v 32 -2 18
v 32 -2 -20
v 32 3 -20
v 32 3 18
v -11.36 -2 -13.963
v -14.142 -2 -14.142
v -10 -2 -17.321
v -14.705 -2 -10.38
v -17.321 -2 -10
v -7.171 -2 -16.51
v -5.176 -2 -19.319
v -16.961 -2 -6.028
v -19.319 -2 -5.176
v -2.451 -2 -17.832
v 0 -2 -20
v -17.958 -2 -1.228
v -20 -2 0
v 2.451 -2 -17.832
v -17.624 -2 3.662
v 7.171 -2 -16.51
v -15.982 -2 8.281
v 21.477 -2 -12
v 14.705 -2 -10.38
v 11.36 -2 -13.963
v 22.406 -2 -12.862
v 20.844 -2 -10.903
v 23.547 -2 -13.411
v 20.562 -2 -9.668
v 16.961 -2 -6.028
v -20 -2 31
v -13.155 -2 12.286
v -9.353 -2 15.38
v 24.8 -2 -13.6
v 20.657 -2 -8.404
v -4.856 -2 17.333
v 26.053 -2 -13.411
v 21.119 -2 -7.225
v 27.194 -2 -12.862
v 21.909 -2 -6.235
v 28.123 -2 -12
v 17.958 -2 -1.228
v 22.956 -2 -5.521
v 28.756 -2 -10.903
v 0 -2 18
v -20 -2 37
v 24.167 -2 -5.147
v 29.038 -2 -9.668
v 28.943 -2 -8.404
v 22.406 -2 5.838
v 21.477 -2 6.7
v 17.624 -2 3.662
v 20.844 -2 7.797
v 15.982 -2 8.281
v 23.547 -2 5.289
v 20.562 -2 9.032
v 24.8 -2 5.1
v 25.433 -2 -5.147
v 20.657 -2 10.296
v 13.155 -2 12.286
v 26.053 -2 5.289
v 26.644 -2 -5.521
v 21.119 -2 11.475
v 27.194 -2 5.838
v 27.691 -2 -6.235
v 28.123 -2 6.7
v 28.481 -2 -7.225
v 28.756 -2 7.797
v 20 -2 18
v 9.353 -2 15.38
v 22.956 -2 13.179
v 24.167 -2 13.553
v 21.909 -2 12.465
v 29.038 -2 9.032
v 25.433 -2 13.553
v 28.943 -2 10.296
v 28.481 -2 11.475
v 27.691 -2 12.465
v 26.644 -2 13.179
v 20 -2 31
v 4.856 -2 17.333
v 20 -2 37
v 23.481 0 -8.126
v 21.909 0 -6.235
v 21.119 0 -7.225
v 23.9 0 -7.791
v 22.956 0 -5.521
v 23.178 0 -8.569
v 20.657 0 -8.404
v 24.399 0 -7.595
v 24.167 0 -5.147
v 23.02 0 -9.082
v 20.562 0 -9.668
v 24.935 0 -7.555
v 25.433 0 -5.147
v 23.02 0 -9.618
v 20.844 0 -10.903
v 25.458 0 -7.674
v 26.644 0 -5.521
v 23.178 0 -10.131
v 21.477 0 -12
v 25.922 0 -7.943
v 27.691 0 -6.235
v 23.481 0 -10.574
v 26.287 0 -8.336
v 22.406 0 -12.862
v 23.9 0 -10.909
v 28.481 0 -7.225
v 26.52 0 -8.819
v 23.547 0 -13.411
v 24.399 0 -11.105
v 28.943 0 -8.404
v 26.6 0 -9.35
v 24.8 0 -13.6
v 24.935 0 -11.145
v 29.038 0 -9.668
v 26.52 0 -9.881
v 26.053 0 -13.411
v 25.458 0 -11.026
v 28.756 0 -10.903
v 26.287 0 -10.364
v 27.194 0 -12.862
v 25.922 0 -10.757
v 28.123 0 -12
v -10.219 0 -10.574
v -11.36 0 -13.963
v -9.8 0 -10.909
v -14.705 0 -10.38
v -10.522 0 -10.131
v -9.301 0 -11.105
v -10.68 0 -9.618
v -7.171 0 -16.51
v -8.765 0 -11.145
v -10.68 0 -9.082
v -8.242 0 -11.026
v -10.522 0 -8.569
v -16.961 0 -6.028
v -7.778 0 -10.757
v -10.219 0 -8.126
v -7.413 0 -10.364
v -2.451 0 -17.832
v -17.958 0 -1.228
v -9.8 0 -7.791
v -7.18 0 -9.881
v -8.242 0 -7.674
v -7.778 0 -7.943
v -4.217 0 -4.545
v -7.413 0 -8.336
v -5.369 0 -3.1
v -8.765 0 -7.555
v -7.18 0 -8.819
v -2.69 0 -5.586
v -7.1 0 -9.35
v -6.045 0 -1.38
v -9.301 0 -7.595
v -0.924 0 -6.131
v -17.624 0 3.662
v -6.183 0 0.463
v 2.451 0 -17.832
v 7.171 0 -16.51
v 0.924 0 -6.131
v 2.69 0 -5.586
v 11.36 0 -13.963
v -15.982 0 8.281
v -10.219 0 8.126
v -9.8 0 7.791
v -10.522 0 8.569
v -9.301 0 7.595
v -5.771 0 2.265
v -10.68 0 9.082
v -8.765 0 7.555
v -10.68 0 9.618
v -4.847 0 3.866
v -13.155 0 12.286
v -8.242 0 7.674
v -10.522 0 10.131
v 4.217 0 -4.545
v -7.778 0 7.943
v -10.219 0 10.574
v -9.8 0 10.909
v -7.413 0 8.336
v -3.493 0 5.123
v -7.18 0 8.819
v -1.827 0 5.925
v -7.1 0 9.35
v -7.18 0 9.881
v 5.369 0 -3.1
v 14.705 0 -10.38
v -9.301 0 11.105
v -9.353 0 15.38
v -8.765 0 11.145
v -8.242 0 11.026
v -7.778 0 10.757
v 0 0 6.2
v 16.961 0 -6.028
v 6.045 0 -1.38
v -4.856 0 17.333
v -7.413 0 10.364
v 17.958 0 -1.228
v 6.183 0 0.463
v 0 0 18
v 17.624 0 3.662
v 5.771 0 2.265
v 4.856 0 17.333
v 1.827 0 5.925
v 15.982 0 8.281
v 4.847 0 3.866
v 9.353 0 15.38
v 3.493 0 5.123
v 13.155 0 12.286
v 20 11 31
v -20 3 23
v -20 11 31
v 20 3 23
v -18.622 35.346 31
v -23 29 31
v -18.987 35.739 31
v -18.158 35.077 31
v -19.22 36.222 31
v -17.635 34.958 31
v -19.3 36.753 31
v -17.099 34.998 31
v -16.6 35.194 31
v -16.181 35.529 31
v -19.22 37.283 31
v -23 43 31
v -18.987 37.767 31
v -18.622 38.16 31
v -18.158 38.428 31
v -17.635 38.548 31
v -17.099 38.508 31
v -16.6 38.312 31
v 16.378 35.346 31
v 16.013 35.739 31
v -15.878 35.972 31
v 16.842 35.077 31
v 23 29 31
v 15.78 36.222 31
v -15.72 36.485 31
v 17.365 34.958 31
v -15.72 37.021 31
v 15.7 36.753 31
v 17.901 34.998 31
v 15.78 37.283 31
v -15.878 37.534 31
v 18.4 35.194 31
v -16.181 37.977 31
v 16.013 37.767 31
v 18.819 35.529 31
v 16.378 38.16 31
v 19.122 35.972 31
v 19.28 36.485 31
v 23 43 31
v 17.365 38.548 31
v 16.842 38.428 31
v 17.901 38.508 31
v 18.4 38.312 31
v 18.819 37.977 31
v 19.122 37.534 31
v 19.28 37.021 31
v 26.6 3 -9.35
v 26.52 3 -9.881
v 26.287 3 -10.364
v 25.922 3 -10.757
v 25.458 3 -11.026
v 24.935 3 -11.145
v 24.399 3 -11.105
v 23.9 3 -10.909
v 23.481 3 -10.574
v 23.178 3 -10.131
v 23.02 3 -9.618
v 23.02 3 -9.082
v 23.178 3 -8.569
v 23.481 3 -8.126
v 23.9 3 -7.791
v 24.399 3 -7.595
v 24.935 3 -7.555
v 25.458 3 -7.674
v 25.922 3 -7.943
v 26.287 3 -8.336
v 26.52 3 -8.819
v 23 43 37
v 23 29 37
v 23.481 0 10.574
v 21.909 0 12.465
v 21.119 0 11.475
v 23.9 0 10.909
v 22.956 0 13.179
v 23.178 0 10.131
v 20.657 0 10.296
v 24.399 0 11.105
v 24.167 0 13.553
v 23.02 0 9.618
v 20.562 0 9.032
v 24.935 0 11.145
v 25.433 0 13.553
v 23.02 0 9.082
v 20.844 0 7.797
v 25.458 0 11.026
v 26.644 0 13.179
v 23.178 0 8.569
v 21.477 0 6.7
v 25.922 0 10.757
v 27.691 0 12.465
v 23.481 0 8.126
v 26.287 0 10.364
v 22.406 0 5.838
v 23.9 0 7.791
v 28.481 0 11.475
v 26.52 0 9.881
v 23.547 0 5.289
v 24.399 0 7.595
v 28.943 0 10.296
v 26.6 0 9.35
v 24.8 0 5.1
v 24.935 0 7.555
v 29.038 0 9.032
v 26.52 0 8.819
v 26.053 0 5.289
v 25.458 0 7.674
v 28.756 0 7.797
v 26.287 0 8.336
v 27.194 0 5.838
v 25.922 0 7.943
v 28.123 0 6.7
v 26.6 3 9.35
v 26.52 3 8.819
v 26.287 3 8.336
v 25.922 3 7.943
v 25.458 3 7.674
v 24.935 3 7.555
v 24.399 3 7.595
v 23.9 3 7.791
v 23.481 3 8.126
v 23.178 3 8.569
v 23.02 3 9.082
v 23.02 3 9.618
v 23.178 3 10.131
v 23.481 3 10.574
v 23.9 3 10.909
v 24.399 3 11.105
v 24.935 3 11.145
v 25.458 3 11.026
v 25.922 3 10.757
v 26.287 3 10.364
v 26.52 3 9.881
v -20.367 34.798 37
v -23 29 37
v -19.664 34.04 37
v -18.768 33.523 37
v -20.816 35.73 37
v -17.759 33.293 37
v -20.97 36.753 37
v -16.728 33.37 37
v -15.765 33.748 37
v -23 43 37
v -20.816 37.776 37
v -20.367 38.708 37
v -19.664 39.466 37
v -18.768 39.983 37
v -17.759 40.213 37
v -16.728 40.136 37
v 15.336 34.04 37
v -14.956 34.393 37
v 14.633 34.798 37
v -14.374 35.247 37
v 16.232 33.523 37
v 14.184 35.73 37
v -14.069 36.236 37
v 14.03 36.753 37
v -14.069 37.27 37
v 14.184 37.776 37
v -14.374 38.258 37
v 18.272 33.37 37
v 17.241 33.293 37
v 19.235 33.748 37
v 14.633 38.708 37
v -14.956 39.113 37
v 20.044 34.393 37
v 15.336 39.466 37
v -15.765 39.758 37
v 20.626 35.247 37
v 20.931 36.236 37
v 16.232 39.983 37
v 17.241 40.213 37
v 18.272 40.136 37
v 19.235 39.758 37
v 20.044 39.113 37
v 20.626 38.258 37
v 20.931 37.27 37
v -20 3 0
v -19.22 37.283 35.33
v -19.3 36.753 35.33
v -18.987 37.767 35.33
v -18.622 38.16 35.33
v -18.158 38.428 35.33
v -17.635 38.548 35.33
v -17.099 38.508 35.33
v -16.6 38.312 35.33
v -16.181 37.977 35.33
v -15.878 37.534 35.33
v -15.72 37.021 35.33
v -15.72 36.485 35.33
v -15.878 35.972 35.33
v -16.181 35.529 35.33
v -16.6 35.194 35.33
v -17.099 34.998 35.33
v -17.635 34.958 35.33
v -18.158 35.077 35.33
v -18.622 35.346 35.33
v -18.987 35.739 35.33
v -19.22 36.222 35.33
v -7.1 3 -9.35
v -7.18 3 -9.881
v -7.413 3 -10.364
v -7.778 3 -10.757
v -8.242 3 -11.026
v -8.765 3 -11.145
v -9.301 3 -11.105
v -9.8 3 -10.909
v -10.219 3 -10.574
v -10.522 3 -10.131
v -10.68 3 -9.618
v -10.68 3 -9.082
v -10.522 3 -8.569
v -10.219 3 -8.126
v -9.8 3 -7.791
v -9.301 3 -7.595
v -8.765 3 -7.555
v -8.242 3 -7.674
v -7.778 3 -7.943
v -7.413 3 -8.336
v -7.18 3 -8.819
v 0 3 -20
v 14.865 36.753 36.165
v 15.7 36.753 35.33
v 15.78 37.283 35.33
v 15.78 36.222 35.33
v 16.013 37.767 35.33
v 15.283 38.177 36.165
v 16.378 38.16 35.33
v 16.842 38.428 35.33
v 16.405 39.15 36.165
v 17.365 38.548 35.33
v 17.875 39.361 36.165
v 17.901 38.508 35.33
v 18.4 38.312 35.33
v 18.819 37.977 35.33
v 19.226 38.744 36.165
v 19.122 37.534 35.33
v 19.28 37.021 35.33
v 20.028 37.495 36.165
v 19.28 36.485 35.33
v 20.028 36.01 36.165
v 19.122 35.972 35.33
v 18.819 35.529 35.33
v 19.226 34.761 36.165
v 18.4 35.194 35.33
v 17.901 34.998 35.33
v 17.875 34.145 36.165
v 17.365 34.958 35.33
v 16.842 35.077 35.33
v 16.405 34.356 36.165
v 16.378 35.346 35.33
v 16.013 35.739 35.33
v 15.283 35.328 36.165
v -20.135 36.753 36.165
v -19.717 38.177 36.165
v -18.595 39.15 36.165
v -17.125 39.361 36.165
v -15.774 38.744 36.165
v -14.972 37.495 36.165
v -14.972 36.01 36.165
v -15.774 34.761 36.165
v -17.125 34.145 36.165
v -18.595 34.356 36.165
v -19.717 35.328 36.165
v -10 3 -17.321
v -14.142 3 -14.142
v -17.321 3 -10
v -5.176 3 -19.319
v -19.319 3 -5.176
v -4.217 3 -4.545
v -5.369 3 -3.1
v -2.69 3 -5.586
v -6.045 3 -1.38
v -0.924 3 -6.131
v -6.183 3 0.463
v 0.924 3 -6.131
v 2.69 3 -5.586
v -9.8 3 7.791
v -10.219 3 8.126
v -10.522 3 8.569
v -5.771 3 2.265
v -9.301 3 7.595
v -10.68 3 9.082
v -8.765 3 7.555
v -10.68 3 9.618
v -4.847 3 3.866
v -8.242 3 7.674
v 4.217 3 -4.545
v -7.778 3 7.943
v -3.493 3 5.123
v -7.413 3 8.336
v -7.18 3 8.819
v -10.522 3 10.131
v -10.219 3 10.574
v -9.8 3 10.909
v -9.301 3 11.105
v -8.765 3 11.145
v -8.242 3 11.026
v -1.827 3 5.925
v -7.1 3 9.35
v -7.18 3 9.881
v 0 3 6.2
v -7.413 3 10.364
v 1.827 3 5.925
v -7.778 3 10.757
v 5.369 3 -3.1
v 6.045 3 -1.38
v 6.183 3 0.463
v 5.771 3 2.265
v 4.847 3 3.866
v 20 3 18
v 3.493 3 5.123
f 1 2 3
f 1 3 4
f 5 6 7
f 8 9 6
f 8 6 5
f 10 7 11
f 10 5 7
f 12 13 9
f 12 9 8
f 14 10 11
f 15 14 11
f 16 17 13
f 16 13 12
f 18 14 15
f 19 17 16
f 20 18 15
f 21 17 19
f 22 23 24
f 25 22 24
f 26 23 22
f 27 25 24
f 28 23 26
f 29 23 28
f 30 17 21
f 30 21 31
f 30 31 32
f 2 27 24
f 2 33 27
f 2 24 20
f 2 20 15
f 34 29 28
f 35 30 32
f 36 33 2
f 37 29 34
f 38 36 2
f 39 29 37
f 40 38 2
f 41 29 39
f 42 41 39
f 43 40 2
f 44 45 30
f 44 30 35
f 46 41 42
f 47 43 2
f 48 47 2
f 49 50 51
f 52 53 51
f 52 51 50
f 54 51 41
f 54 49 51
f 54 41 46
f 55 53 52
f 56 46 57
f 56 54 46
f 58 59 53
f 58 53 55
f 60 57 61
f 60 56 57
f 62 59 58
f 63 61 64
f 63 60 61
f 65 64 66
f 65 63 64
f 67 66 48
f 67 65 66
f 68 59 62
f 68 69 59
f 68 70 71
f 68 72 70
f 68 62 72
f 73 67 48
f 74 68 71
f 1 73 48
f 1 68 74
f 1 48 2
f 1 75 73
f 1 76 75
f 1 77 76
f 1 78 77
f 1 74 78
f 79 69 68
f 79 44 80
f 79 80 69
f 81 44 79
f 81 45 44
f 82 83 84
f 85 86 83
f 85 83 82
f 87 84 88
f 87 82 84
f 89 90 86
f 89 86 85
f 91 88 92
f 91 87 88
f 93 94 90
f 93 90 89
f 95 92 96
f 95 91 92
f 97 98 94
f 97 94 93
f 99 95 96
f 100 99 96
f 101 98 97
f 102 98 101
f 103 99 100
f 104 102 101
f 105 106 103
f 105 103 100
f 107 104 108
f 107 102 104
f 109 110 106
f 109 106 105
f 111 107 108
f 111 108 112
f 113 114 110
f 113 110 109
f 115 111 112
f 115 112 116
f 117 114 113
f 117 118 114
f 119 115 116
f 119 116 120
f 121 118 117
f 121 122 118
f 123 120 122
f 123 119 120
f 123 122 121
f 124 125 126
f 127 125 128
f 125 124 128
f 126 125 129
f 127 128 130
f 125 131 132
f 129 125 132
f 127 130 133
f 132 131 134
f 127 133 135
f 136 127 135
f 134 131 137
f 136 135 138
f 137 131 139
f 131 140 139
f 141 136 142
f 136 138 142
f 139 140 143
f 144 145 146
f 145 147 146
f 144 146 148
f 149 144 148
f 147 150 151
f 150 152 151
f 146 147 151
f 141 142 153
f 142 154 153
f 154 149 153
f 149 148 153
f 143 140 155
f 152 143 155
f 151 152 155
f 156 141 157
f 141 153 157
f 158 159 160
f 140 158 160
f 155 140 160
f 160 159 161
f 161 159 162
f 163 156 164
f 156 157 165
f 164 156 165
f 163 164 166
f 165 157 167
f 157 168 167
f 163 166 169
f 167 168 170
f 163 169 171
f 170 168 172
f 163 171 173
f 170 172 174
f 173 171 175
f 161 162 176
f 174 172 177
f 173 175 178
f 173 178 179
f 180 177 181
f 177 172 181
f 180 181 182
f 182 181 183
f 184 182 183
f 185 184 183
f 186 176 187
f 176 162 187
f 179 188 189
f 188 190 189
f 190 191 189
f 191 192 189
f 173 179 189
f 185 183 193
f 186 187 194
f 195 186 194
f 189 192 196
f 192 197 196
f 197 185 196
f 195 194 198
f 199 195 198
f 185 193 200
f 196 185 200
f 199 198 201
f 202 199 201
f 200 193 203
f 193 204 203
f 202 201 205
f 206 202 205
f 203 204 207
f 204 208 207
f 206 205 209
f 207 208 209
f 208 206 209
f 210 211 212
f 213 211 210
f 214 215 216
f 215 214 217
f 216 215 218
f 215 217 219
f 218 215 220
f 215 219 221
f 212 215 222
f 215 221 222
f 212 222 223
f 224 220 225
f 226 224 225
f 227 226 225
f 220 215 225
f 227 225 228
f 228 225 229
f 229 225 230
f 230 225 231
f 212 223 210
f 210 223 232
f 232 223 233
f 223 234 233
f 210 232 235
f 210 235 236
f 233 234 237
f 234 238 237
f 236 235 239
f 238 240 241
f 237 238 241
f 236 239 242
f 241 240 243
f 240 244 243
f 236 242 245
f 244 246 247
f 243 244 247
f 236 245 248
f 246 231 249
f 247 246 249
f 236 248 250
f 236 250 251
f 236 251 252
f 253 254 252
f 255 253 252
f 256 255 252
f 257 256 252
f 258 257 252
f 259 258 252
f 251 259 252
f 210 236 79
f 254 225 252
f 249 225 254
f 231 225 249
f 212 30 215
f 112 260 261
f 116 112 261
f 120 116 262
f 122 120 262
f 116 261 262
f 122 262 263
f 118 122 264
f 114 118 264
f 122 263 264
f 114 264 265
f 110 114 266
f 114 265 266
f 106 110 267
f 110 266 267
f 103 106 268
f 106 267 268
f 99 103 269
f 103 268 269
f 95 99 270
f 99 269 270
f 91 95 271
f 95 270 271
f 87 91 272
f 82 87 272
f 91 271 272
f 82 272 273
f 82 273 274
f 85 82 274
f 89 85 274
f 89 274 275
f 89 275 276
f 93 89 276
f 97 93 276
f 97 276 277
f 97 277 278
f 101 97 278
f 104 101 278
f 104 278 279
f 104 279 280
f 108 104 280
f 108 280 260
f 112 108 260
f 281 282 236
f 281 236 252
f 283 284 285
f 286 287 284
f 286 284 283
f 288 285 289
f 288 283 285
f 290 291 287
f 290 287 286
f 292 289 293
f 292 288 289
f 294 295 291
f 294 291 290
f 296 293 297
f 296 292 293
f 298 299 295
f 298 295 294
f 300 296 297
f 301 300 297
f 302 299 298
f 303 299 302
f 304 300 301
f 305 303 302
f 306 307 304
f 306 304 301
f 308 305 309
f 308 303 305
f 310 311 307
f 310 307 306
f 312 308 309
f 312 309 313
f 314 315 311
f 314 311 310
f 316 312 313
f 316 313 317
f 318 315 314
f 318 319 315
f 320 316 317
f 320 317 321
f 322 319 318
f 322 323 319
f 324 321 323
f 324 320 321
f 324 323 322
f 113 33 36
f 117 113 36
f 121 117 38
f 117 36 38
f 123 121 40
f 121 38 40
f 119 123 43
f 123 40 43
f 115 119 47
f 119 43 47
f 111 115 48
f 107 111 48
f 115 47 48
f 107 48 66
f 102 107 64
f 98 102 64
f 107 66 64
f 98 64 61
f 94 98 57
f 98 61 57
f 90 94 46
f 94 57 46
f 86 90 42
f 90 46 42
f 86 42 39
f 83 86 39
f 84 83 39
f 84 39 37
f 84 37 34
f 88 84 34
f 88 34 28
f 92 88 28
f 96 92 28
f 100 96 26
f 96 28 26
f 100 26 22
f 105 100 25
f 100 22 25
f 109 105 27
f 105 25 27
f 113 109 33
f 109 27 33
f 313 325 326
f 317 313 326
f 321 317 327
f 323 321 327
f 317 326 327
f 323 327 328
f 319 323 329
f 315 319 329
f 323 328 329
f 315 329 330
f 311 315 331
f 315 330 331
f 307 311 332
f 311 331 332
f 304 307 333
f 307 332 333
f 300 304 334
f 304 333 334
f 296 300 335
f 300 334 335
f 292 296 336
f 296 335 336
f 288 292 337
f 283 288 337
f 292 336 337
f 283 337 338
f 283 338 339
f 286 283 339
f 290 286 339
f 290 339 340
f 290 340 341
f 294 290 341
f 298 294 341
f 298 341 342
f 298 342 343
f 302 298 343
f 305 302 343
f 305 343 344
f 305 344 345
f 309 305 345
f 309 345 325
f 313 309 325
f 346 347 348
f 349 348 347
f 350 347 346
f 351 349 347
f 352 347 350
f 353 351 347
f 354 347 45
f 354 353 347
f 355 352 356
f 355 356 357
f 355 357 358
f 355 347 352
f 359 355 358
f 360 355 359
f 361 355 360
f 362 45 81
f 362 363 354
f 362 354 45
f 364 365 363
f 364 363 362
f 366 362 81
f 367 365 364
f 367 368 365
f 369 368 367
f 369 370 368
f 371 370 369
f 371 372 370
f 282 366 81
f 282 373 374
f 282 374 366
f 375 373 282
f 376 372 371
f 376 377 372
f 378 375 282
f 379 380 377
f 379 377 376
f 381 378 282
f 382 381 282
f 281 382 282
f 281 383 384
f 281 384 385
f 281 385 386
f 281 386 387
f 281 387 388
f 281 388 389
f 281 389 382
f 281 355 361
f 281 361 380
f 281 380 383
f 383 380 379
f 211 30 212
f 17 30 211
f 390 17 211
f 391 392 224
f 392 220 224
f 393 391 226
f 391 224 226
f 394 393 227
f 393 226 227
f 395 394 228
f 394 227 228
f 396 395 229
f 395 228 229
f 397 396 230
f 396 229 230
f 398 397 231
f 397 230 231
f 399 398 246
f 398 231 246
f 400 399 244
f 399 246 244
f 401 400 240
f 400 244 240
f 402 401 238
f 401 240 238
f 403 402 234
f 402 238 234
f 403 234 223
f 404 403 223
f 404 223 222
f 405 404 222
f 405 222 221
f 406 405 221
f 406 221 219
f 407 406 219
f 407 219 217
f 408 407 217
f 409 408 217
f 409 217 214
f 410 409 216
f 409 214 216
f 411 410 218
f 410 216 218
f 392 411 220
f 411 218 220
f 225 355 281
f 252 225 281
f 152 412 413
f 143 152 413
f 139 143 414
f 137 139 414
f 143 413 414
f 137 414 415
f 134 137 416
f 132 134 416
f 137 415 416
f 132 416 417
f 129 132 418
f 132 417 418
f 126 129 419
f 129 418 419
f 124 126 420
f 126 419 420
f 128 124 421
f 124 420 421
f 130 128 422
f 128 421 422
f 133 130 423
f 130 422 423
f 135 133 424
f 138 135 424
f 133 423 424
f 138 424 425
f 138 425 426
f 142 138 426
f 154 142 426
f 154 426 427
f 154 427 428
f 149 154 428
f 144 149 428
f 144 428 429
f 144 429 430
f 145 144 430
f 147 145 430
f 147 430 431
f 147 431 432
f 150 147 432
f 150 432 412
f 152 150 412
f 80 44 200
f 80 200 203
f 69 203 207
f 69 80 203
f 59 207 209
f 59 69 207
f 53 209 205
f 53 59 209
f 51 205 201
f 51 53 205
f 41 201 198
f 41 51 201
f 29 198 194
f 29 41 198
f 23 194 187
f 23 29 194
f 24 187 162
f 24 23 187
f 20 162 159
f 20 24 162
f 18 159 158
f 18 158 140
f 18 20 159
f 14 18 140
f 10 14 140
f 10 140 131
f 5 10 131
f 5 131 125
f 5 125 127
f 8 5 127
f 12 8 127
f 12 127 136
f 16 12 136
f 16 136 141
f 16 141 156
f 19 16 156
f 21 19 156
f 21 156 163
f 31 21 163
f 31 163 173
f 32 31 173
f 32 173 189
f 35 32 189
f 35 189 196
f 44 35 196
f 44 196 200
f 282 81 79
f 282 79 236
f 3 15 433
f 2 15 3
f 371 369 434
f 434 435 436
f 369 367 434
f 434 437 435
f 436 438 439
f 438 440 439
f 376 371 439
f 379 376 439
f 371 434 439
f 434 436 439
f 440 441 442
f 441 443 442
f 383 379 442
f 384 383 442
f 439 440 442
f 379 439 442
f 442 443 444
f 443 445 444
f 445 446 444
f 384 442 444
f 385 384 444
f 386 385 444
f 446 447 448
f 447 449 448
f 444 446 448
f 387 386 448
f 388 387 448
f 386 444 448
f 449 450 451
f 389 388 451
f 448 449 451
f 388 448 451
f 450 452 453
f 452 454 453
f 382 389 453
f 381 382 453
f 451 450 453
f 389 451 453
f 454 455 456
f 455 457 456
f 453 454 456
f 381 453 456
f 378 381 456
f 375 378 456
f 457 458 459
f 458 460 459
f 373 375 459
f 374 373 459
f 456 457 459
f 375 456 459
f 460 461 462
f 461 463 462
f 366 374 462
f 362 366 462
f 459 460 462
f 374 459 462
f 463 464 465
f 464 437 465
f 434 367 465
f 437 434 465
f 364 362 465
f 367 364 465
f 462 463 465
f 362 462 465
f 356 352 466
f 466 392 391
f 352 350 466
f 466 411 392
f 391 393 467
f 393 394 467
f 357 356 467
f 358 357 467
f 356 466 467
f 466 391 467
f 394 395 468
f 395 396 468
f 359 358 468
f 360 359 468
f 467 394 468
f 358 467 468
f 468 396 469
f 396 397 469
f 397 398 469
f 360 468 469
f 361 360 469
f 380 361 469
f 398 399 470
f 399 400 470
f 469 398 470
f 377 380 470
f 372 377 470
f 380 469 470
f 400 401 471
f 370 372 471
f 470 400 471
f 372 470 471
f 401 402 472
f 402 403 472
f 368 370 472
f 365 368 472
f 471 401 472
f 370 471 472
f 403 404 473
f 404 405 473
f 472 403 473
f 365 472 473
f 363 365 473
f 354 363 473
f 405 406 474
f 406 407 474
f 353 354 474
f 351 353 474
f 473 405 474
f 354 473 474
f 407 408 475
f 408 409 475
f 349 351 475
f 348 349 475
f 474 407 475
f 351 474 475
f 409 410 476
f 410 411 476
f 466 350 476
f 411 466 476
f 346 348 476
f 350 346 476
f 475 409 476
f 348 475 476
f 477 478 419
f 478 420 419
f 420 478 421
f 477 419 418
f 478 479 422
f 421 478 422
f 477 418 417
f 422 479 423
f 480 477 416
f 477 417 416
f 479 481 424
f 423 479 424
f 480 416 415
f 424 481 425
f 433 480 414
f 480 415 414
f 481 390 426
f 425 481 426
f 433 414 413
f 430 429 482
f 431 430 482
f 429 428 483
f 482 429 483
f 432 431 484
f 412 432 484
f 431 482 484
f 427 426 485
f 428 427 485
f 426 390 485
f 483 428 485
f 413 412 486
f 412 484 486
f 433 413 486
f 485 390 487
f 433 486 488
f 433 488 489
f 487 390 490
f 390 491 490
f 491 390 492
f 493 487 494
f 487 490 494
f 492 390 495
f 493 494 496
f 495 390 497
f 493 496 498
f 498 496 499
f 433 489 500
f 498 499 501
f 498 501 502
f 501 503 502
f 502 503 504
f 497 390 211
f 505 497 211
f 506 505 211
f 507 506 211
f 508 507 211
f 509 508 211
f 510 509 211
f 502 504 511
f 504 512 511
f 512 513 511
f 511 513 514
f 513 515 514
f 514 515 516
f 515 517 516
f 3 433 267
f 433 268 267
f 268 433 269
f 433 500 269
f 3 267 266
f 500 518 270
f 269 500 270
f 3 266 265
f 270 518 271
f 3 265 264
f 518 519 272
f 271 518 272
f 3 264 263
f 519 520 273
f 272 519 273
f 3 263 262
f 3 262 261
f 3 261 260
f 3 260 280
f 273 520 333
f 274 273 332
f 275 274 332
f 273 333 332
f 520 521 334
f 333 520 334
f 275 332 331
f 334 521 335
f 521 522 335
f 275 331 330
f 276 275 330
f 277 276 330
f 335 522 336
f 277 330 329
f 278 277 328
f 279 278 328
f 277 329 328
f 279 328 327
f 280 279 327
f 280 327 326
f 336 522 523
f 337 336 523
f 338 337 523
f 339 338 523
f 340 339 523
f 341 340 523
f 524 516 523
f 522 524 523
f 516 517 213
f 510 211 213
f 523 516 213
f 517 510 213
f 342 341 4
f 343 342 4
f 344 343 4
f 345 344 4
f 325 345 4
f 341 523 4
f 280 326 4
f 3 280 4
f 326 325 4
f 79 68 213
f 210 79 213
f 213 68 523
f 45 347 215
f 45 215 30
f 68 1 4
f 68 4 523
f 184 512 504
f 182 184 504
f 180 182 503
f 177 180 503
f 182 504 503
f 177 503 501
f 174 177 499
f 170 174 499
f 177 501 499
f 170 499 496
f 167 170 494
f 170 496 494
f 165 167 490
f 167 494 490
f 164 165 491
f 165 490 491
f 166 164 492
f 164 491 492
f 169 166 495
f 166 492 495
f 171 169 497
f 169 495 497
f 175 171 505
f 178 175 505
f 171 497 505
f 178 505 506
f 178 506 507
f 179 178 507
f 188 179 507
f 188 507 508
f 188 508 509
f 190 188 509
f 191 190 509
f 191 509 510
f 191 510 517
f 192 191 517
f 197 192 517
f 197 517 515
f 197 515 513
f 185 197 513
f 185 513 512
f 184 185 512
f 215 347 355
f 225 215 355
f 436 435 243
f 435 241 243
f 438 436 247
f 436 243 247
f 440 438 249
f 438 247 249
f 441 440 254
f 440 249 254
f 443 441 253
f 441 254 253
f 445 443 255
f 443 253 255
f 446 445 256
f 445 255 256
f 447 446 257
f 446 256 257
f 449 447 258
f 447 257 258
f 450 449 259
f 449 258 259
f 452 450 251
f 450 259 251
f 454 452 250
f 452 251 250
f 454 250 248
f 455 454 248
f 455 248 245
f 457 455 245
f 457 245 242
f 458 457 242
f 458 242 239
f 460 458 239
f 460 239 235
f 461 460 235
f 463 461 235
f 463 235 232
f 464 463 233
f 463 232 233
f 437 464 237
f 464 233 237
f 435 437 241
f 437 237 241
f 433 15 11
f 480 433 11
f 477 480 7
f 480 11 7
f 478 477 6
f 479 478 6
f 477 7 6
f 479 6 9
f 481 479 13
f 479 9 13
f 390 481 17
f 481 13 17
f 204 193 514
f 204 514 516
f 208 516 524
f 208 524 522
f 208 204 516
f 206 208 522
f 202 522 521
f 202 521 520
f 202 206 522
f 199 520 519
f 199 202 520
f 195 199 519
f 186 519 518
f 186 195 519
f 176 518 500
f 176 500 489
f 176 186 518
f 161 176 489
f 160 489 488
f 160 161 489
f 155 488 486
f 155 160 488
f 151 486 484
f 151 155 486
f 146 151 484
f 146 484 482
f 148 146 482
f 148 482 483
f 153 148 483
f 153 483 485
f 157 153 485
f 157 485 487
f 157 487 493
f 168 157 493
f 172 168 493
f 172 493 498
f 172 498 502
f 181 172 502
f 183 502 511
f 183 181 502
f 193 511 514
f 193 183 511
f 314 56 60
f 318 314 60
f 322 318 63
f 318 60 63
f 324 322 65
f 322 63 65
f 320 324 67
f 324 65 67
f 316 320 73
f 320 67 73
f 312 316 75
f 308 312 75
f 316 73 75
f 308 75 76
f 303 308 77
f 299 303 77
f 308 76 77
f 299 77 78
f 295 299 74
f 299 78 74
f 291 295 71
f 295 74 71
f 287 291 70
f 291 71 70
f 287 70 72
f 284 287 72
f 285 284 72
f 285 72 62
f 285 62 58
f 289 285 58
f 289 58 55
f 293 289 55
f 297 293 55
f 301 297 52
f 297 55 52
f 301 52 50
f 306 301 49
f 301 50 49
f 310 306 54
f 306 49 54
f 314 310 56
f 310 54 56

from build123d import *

# Parameters (mm, degrees)
SKETCH1_R                                            = 18
SKETCH1_R_2                                          = 6.2
BOSS_EXTRUDE1_DEPTH                                  = 3
BOSS_EXTRUDE2_START                                  = -5
SKETCH5_R                                            = 20
SKETCH5_R_2                                          = 18
BOSS_EXTRUDE2_DEPTH                                  = 5
BOSS_EXTRUDE3_START                                  = -5
BOSS_EXTRUDE3_DEPTH                                  = 5
SKETCH7_W                                            = 40
SKETCH7_H                                            = 45
BOSS_EXTRUDE4_DEPTH                                  = 6
SKETCH8_W                                            = 46
SKETCH8_H                                            = 14
BOSS_EXTRUDE5_DEPTH                                  = 6
BOSS_EXTRUDE6_DEPTH                                  = 6
CHAMFER1_SIZE                                        = 8
CSK_FOR_M3_HEX_SOCKET_COUNTERSUNK_HEAD_S_D           = 3.6
CSK_FOR_M3_HEX_SOCKET_COUNTERSUNK_HEAD_S_CSINK_D     = 6.94
CSK_FOR_M3_HEX_SOCKET_COUNTERSUNK_HEAD_S_CSINK_ANGLE = 90
BOSS_EXTRUDE7_DEPTH                                  = 5
M3_CLEARANCE_HOLE3_D                                 = 3.6
SKETCH26_R                                           = 4.25
CUT_EXTRUDE3_DEPTH                                   = 2


with BuildPart() as part:
    # Sketch1 → Boss-Extrude1 (new body)
    with BuildSketch(Plane(origin=(0, 0, 0), x_dir=(1, 0, 0), z_dir=(0, 1, 0))):
        with Locations(Location((0, 0, 0), (0, 0, 270))):
            Circle(SKETCH1_R)
        with Locations(Location((0, 0, 0), (0, 0, 270))):
            Circle(SKETCH1_R_2, mode=Mode.SUBTRACT)
    extrude(amount=BOSS_EXTRUDE1_DEPTH)

    # Sketch5 → Boss-Extrude2 (add)
    with BuildSketch(Plane(origin=(0, 3, 0), x_dir=(1, 0, 0), z_dir=(0, 1, 0)).offset(BOSS_EXTRUDE2_START)):
        with Locations(Location((0, 0, 0), (0, 0, 270))):
            Circle(SKETCH5_R)
        with Locations(Location((0, 0, 0), (0, 0, 270))):
            Circle(SKETCH5_R_2, mode=Mode.SUBTRACT)
    extrude(amount=BOSS_EXTRUDE2_DEPTH)

    # Sketch6 → Boss-Extrude3 (add)
    with BuildSketch(Plane(origin=(0, 3, 0), x_dir=(1, 0, 0), z_dir=(0, 1, 0)).offset(BOSS_EXTRUDE3_START)):
        with BuildLine():
            Line((-20, 0), (-20, -31))
            Line((-20, -31), (20, -31))
            Line((20, -31), (20, 0))
            ThreePointArc((20, 0), (0, -20), (-20, 0))
        make_face()
    extrude(amount=BOSS_EXTRUDE3_DEPTH)

    # Sketch7 → Boss-Extrude4 (add)
    with BuildSketch(Plane.XY.offset(31)):
        with Locations((0, 20.5)):
            Rectangle(SKETCH7_W, SKETCH7_H)
    extrude(amount=BOSS_EXTRUDE4_DEPTH)

    # Sketch8 → Boss-Extrude5 (add)
    with BuildSketch(Plane.XY.offset(37)):
        with Locations((0, 36)):
            Rectangle(SKETCH8_W, SKETCH8_H)
    extrude(amount=-BOSS_EXTRUDE5_DEPTH)

    # Sketch9 → Boss-Extrude6 (add)
    with BuildSketch(Plane.XY.offset(37)):
        Polygon((-23, 29), (-20, -2), (-20, 29), align=None)
        Polygon((20, -2), (23, 29), (20, 29), align=None)
    extrude(amount=-BOSS_EXTRUDE6_DEPTH)

    # Chamfer1
    chamfer1_edges = [part.edges().sort_by_distance(p)[0] for p in [
        (0, 3, 31),
    ]]
    chamfer(chamfer1_edges, length=CHAMFER1_SIZE)

    # CSK for M3 Hex Socket Countersunk Head Screw1 (through all)
    with Locations(Plane.XY.offset(37)):
        with Locations((17.5, 36.752814471), (-17.5, 36.752814471)):
            CounterSinkHole(CSK_FOR_M3_HEX_SOCKET_COUNTERSUNK_HEAD_S_D / 2, CSK_FOR_M3_HEX_SOCKET_COUNTERSUNK_HEAD_S_CSINK_D / 2, counter_sink_angle=CSK_FOR_M3_HEX_SOCKET_COUNTERSUNK_HEAD_S_CSINK_ANGLE)

    # Sketch23 → Boss-Extrude7 (add)
    with BuildSketch(Plane.XZ.offset(2)):
        with BuildLine():
            Line((0, -20), (32, -20))
            Line((32, -20), (32, 18))
            Line((32, 18), (20, 18))
            Line((20, 18), (20, 0))
            ThreePointArc((20, 0), (14.142135624, -14.142135624), (0, -20))
        make_face()
    extrude(amount=-BOSS_EXTRUDE7_DEPTH)

    # M3 Clearance Hole3 (through all)
    with Locations(Plane(origin=(0, -2, 0), x_dir=(-1, 0, 0), z_dir=(0, -1, 0))):
        with Locations((-24.8, 9.35), (8.9, 9.35), (8.9, -9.35), (-24.8, -9.35)):
            Hole(M3_CLEARANCE_HOLE3_D / 2)

    # Sketch26 → Cut-Extrude3 (cut)
    with BuildSketch(Plane.XZ.offset(2)):
        with Locations(Location((24.8, 9.35, 0), (0, 0, 270))):
            Circle(SKETCH26_R)
        with Locations(Location((24.8, -9.35, 0), (0, 0, 270))):
            Circle(SKETCH26_R)
    extrude(amount=-CUT_EXTRUDE3_DEPTH, mode=Mode.SUBTRACT)


solid = part.part
